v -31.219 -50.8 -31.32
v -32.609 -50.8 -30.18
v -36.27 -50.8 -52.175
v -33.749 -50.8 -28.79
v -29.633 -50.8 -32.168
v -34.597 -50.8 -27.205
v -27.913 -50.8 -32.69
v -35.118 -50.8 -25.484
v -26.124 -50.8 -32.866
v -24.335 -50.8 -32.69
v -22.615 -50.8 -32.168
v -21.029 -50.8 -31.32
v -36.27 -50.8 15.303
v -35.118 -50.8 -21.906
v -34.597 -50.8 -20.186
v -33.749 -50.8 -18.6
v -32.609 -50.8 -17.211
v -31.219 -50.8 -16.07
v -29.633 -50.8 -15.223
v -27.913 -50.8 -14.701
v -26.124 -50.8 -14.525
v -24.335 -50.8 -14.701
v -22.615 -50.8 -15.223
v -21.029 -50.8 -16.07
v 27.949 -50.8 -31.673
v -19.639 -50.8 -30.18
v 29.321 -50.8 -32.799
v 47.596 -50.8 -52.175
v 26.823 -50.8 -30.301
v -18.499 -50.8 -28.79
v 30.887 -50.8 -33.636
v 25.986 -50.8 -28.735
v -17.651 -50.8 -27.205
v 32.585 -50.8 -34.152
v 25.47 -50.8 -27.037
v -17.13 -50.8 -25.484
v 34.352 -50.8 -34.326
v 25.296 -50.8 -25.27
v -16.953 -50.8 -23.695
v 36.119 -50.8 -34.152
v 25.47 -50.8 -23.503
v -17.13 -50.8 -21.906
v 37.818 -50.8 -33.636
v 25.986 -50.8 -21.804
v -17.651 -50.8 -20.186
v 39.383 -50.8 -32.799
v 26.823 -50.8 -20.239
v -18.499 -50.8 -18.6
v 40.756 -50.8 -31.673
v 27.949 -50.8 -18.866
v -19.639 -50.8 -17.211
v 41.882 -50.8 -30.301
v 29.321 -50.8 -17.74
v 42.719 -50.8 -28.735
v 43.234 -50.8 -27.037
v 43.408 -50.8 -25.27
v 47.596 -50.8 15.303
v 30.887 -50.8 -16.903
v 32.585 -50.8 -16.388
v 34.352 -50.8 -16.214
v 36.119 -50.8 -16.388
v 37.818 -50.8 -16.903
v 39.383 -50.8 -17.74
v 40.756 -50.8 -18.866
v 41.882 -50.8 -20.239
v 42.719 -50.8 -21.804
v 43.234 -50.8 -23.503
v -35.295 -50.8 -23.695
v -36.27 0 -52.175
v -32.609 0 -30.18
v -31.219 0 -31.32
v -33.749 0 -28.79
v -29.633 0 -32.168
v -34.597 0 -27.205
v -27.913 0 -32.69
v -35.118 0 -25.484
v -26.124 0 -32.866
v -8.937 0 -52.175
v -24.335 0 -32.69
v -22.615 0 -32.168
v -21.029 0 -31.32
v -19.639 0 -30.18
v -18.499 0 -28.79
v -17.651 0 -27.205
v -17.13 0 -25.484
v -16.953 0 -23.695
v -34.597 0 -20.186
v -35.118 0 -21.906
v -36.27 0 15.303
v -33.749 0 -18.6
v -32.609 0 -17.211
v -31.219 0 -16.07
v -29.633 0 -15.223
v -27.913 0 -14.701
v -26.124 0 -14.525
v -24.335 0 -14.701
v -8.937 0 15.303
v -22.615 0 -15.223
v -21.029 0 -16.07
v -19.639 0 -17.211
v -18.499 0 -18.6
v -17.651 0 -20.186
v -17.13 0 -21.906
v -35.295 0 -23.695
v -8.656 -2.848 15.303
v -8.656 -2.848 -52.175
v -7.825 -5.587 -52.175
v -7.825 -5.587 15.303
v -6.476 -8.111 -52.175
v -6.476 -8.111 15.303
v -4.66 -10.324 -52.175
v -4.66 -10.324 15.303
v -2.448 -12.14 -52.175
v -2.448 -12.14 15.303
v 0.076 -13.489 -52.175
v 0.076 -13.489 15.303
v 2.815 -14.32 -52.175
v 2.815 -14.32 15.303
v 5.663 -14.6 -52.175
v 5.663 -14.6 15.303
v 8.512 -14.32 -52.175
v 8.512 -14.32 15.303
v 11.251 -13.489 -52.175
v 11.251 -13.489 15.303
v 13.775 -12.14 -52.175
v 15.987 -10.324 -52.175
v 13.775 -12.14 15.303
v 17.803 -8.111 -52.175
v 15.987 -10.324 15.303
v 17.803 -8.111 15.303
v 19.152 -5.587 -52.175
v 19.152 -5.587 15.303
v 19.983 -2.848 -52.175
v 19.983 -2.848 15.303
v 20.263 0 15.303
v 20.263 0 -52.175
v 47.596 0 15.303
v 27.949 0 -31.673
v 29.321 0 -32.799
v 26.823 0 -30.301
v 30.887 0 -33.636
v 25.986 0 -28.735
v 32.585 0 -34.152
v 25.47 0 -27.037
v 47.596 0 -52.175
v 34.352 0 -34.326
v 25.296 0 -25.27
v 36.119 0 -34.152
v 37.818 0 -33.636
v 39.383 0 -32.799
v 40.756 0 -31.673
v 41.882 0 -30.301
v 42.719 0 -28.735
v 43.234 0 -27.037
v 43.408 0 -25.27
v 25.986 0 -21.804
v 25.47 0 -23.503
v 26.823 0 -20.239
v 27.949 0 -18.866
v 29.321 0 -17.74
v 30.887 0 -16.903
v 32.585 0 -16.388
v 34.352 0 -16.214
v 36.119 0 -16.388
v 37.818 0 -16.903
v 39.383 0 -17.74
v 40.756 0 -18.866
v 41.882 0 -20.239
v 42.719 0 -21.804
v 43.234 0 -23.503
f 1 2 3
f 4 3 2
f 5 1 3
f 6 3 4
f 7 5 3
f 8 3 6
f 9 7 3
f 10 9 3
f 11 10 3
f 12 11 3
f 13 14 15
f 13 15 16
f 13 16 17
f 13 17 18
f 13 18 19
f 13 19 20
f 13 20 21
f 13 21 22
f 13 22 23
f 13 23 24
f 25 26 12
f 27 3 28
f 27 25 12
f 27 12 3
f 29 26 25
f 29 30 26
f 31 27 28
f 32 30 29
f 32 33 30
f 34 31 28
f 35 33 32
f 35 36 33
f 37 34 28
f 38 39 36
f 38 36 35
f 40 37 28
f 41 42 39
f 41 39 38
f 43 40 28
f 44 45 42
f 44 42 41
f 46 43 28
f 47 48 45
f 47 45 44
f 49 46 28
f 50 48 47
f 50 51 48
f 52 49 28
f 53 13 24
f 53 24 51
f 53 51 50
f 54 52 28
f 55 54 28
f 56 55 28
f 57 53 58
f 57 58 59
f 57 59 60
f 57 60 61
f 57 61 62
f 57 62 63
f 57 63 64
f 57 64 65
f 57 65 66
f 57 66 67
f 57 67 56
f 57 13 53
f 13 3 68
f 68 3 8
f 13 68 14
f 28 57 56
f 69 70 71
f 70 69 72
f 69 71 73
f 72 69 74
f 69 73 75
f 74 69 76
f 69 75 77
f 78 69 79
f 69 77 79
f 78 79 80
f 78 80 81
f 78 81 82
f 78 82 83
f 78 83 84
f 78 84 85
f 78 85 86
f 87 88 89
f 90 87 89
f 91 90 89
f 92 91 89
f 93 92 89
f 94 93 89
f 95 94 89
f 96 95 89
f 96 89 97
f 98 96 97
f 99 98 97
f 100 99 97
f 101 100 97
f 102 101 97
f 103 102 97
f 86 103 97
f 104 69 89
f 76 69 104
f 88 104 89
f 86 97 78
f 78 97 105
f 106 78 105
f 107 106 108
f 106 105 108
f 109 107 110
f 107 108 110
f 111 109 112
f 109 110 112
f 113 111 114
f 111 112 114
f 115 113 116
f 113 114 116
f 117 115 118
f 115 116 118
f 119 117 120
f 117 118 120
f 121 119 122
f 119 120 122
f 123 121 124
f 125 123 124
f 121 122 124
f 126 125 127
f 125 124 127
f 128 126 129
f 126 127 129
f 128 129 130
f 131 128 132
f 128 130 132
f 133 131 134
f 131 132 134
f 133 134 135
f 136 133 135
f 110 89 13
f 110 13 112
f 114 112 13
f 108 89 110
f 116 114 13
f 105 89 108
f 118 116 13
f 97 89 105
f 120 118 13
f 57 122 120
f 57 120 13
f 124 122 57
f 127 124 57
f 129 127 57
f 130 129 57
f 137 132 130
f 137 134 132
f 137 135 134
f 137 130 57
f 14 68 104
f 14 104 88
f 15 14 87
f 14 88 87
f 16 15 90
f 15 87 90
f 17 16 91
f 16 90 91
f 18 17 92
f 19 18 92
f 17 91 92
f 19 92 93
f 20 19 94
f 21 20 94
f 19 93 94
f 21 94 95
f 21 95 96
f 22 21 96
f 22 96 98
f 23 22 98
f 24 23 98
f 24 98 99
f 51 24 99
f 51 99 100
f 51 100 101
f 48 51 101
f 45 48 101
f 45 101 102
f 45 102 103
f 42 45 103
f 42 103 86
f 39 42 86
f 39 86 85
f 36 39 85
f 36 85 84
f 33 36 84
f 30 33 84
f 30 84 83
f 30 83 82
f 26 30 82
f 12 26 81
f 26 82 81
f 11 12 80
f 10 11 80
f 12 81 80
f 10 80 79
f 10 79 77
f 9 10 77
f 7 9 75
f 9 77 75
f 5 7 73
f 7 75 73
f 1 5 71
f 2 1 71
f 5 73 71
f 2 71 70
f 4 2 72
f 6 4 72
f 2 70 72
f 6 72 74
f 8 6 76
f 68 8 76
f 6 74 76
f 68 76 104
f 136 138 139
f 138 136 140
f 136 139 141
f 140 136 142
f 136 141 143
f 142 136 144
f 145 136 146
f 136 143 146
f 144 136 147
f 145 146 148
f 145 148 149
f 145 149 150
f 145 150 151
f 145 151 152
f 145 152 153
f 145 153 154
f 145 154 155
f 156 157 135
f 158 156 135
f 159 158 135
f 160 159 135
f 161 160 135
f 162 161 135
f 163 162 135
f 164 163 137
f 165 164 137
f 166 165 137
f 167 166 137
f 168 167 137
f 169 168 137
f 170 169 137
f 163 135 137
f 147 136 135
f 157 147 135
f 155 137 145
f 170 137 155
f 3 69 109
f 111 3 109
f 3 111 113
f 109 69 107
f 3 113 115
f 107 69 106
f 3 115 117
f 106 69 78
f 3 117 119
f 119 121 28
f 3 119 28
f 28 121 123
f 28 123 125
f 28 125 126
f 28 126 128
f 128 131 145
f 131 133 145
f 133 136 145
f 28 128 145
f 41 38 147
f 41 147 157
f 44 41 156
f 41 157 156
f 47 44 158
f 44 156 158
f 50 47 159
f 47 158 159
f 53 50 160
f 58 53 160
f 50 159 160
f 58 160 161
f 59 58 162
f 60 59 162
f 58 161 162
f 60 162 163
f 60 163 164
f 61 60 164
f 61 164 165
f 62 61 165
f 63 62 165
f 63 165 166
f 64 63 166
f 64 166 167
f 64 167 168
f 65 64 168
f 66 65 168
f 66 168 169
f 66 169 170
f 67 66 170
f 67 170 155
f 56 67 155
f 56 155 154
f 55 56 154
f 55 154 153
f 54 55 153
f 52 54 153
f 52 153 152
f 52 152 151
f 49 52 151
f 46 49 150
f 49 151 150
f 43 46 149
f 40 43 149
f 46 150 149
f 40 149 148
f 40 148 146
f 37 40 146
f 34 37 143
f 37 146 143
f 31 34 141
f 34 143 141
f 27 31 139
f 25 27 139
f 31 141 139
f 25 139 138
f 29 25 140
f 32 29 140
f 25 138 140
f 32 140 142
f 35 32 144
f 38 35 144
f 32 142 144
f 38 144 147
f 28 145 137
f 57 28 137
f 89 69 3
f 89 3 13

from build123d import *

# Parameters (mm, degrees)
F0_W     = 83.865903
F0_H     = 67.478316
F1_DEPTH = 50.8
F3_DEPTH = 74.422
F4_R     = 9.170677
F4_R_2   = 9.055805
F5_DEPTH = 65.278


with BuildPart() as f1:
    # F0 (on Front) → F1 (new body)
    with BuildSketch(Plane.XZ):
        with Locations((5.663358, -18.43604)):
            Rectangle(F0_W, F0_H)
    extrude(amount=F1_DEPTH)

    # F2 (on face) → F3 (cut)
    with BuildSketch(Plane.XY.offset(15.303118)):
        with BuildLine():
            ThreePointArc((-8.936779, 0), (5.663358, -14.600136), (20.263494, 0))
            Line((20.263494, 0), (-8.936779, 0))
        make_face()
    extrude(amount=-F3_DEPTH, mode=Mode.SUBTRACT)

    # F4 (on face) → F5 (cut)
    with BuildSketch(Plane(origin=(0, 0, 0), x_dir=(-1, 0, 0), z_dir=(0, 1, 0))):
        with Locations((26.124012, -23.695314)):
            Circle(F4_R)
        with Locations((-34.352176, -25.269844)):
            Circle(F4_R_2)
    extrude(amount=-F5_DEPTH, mode=Mode.SUBTRACT)


solid = f1.part
